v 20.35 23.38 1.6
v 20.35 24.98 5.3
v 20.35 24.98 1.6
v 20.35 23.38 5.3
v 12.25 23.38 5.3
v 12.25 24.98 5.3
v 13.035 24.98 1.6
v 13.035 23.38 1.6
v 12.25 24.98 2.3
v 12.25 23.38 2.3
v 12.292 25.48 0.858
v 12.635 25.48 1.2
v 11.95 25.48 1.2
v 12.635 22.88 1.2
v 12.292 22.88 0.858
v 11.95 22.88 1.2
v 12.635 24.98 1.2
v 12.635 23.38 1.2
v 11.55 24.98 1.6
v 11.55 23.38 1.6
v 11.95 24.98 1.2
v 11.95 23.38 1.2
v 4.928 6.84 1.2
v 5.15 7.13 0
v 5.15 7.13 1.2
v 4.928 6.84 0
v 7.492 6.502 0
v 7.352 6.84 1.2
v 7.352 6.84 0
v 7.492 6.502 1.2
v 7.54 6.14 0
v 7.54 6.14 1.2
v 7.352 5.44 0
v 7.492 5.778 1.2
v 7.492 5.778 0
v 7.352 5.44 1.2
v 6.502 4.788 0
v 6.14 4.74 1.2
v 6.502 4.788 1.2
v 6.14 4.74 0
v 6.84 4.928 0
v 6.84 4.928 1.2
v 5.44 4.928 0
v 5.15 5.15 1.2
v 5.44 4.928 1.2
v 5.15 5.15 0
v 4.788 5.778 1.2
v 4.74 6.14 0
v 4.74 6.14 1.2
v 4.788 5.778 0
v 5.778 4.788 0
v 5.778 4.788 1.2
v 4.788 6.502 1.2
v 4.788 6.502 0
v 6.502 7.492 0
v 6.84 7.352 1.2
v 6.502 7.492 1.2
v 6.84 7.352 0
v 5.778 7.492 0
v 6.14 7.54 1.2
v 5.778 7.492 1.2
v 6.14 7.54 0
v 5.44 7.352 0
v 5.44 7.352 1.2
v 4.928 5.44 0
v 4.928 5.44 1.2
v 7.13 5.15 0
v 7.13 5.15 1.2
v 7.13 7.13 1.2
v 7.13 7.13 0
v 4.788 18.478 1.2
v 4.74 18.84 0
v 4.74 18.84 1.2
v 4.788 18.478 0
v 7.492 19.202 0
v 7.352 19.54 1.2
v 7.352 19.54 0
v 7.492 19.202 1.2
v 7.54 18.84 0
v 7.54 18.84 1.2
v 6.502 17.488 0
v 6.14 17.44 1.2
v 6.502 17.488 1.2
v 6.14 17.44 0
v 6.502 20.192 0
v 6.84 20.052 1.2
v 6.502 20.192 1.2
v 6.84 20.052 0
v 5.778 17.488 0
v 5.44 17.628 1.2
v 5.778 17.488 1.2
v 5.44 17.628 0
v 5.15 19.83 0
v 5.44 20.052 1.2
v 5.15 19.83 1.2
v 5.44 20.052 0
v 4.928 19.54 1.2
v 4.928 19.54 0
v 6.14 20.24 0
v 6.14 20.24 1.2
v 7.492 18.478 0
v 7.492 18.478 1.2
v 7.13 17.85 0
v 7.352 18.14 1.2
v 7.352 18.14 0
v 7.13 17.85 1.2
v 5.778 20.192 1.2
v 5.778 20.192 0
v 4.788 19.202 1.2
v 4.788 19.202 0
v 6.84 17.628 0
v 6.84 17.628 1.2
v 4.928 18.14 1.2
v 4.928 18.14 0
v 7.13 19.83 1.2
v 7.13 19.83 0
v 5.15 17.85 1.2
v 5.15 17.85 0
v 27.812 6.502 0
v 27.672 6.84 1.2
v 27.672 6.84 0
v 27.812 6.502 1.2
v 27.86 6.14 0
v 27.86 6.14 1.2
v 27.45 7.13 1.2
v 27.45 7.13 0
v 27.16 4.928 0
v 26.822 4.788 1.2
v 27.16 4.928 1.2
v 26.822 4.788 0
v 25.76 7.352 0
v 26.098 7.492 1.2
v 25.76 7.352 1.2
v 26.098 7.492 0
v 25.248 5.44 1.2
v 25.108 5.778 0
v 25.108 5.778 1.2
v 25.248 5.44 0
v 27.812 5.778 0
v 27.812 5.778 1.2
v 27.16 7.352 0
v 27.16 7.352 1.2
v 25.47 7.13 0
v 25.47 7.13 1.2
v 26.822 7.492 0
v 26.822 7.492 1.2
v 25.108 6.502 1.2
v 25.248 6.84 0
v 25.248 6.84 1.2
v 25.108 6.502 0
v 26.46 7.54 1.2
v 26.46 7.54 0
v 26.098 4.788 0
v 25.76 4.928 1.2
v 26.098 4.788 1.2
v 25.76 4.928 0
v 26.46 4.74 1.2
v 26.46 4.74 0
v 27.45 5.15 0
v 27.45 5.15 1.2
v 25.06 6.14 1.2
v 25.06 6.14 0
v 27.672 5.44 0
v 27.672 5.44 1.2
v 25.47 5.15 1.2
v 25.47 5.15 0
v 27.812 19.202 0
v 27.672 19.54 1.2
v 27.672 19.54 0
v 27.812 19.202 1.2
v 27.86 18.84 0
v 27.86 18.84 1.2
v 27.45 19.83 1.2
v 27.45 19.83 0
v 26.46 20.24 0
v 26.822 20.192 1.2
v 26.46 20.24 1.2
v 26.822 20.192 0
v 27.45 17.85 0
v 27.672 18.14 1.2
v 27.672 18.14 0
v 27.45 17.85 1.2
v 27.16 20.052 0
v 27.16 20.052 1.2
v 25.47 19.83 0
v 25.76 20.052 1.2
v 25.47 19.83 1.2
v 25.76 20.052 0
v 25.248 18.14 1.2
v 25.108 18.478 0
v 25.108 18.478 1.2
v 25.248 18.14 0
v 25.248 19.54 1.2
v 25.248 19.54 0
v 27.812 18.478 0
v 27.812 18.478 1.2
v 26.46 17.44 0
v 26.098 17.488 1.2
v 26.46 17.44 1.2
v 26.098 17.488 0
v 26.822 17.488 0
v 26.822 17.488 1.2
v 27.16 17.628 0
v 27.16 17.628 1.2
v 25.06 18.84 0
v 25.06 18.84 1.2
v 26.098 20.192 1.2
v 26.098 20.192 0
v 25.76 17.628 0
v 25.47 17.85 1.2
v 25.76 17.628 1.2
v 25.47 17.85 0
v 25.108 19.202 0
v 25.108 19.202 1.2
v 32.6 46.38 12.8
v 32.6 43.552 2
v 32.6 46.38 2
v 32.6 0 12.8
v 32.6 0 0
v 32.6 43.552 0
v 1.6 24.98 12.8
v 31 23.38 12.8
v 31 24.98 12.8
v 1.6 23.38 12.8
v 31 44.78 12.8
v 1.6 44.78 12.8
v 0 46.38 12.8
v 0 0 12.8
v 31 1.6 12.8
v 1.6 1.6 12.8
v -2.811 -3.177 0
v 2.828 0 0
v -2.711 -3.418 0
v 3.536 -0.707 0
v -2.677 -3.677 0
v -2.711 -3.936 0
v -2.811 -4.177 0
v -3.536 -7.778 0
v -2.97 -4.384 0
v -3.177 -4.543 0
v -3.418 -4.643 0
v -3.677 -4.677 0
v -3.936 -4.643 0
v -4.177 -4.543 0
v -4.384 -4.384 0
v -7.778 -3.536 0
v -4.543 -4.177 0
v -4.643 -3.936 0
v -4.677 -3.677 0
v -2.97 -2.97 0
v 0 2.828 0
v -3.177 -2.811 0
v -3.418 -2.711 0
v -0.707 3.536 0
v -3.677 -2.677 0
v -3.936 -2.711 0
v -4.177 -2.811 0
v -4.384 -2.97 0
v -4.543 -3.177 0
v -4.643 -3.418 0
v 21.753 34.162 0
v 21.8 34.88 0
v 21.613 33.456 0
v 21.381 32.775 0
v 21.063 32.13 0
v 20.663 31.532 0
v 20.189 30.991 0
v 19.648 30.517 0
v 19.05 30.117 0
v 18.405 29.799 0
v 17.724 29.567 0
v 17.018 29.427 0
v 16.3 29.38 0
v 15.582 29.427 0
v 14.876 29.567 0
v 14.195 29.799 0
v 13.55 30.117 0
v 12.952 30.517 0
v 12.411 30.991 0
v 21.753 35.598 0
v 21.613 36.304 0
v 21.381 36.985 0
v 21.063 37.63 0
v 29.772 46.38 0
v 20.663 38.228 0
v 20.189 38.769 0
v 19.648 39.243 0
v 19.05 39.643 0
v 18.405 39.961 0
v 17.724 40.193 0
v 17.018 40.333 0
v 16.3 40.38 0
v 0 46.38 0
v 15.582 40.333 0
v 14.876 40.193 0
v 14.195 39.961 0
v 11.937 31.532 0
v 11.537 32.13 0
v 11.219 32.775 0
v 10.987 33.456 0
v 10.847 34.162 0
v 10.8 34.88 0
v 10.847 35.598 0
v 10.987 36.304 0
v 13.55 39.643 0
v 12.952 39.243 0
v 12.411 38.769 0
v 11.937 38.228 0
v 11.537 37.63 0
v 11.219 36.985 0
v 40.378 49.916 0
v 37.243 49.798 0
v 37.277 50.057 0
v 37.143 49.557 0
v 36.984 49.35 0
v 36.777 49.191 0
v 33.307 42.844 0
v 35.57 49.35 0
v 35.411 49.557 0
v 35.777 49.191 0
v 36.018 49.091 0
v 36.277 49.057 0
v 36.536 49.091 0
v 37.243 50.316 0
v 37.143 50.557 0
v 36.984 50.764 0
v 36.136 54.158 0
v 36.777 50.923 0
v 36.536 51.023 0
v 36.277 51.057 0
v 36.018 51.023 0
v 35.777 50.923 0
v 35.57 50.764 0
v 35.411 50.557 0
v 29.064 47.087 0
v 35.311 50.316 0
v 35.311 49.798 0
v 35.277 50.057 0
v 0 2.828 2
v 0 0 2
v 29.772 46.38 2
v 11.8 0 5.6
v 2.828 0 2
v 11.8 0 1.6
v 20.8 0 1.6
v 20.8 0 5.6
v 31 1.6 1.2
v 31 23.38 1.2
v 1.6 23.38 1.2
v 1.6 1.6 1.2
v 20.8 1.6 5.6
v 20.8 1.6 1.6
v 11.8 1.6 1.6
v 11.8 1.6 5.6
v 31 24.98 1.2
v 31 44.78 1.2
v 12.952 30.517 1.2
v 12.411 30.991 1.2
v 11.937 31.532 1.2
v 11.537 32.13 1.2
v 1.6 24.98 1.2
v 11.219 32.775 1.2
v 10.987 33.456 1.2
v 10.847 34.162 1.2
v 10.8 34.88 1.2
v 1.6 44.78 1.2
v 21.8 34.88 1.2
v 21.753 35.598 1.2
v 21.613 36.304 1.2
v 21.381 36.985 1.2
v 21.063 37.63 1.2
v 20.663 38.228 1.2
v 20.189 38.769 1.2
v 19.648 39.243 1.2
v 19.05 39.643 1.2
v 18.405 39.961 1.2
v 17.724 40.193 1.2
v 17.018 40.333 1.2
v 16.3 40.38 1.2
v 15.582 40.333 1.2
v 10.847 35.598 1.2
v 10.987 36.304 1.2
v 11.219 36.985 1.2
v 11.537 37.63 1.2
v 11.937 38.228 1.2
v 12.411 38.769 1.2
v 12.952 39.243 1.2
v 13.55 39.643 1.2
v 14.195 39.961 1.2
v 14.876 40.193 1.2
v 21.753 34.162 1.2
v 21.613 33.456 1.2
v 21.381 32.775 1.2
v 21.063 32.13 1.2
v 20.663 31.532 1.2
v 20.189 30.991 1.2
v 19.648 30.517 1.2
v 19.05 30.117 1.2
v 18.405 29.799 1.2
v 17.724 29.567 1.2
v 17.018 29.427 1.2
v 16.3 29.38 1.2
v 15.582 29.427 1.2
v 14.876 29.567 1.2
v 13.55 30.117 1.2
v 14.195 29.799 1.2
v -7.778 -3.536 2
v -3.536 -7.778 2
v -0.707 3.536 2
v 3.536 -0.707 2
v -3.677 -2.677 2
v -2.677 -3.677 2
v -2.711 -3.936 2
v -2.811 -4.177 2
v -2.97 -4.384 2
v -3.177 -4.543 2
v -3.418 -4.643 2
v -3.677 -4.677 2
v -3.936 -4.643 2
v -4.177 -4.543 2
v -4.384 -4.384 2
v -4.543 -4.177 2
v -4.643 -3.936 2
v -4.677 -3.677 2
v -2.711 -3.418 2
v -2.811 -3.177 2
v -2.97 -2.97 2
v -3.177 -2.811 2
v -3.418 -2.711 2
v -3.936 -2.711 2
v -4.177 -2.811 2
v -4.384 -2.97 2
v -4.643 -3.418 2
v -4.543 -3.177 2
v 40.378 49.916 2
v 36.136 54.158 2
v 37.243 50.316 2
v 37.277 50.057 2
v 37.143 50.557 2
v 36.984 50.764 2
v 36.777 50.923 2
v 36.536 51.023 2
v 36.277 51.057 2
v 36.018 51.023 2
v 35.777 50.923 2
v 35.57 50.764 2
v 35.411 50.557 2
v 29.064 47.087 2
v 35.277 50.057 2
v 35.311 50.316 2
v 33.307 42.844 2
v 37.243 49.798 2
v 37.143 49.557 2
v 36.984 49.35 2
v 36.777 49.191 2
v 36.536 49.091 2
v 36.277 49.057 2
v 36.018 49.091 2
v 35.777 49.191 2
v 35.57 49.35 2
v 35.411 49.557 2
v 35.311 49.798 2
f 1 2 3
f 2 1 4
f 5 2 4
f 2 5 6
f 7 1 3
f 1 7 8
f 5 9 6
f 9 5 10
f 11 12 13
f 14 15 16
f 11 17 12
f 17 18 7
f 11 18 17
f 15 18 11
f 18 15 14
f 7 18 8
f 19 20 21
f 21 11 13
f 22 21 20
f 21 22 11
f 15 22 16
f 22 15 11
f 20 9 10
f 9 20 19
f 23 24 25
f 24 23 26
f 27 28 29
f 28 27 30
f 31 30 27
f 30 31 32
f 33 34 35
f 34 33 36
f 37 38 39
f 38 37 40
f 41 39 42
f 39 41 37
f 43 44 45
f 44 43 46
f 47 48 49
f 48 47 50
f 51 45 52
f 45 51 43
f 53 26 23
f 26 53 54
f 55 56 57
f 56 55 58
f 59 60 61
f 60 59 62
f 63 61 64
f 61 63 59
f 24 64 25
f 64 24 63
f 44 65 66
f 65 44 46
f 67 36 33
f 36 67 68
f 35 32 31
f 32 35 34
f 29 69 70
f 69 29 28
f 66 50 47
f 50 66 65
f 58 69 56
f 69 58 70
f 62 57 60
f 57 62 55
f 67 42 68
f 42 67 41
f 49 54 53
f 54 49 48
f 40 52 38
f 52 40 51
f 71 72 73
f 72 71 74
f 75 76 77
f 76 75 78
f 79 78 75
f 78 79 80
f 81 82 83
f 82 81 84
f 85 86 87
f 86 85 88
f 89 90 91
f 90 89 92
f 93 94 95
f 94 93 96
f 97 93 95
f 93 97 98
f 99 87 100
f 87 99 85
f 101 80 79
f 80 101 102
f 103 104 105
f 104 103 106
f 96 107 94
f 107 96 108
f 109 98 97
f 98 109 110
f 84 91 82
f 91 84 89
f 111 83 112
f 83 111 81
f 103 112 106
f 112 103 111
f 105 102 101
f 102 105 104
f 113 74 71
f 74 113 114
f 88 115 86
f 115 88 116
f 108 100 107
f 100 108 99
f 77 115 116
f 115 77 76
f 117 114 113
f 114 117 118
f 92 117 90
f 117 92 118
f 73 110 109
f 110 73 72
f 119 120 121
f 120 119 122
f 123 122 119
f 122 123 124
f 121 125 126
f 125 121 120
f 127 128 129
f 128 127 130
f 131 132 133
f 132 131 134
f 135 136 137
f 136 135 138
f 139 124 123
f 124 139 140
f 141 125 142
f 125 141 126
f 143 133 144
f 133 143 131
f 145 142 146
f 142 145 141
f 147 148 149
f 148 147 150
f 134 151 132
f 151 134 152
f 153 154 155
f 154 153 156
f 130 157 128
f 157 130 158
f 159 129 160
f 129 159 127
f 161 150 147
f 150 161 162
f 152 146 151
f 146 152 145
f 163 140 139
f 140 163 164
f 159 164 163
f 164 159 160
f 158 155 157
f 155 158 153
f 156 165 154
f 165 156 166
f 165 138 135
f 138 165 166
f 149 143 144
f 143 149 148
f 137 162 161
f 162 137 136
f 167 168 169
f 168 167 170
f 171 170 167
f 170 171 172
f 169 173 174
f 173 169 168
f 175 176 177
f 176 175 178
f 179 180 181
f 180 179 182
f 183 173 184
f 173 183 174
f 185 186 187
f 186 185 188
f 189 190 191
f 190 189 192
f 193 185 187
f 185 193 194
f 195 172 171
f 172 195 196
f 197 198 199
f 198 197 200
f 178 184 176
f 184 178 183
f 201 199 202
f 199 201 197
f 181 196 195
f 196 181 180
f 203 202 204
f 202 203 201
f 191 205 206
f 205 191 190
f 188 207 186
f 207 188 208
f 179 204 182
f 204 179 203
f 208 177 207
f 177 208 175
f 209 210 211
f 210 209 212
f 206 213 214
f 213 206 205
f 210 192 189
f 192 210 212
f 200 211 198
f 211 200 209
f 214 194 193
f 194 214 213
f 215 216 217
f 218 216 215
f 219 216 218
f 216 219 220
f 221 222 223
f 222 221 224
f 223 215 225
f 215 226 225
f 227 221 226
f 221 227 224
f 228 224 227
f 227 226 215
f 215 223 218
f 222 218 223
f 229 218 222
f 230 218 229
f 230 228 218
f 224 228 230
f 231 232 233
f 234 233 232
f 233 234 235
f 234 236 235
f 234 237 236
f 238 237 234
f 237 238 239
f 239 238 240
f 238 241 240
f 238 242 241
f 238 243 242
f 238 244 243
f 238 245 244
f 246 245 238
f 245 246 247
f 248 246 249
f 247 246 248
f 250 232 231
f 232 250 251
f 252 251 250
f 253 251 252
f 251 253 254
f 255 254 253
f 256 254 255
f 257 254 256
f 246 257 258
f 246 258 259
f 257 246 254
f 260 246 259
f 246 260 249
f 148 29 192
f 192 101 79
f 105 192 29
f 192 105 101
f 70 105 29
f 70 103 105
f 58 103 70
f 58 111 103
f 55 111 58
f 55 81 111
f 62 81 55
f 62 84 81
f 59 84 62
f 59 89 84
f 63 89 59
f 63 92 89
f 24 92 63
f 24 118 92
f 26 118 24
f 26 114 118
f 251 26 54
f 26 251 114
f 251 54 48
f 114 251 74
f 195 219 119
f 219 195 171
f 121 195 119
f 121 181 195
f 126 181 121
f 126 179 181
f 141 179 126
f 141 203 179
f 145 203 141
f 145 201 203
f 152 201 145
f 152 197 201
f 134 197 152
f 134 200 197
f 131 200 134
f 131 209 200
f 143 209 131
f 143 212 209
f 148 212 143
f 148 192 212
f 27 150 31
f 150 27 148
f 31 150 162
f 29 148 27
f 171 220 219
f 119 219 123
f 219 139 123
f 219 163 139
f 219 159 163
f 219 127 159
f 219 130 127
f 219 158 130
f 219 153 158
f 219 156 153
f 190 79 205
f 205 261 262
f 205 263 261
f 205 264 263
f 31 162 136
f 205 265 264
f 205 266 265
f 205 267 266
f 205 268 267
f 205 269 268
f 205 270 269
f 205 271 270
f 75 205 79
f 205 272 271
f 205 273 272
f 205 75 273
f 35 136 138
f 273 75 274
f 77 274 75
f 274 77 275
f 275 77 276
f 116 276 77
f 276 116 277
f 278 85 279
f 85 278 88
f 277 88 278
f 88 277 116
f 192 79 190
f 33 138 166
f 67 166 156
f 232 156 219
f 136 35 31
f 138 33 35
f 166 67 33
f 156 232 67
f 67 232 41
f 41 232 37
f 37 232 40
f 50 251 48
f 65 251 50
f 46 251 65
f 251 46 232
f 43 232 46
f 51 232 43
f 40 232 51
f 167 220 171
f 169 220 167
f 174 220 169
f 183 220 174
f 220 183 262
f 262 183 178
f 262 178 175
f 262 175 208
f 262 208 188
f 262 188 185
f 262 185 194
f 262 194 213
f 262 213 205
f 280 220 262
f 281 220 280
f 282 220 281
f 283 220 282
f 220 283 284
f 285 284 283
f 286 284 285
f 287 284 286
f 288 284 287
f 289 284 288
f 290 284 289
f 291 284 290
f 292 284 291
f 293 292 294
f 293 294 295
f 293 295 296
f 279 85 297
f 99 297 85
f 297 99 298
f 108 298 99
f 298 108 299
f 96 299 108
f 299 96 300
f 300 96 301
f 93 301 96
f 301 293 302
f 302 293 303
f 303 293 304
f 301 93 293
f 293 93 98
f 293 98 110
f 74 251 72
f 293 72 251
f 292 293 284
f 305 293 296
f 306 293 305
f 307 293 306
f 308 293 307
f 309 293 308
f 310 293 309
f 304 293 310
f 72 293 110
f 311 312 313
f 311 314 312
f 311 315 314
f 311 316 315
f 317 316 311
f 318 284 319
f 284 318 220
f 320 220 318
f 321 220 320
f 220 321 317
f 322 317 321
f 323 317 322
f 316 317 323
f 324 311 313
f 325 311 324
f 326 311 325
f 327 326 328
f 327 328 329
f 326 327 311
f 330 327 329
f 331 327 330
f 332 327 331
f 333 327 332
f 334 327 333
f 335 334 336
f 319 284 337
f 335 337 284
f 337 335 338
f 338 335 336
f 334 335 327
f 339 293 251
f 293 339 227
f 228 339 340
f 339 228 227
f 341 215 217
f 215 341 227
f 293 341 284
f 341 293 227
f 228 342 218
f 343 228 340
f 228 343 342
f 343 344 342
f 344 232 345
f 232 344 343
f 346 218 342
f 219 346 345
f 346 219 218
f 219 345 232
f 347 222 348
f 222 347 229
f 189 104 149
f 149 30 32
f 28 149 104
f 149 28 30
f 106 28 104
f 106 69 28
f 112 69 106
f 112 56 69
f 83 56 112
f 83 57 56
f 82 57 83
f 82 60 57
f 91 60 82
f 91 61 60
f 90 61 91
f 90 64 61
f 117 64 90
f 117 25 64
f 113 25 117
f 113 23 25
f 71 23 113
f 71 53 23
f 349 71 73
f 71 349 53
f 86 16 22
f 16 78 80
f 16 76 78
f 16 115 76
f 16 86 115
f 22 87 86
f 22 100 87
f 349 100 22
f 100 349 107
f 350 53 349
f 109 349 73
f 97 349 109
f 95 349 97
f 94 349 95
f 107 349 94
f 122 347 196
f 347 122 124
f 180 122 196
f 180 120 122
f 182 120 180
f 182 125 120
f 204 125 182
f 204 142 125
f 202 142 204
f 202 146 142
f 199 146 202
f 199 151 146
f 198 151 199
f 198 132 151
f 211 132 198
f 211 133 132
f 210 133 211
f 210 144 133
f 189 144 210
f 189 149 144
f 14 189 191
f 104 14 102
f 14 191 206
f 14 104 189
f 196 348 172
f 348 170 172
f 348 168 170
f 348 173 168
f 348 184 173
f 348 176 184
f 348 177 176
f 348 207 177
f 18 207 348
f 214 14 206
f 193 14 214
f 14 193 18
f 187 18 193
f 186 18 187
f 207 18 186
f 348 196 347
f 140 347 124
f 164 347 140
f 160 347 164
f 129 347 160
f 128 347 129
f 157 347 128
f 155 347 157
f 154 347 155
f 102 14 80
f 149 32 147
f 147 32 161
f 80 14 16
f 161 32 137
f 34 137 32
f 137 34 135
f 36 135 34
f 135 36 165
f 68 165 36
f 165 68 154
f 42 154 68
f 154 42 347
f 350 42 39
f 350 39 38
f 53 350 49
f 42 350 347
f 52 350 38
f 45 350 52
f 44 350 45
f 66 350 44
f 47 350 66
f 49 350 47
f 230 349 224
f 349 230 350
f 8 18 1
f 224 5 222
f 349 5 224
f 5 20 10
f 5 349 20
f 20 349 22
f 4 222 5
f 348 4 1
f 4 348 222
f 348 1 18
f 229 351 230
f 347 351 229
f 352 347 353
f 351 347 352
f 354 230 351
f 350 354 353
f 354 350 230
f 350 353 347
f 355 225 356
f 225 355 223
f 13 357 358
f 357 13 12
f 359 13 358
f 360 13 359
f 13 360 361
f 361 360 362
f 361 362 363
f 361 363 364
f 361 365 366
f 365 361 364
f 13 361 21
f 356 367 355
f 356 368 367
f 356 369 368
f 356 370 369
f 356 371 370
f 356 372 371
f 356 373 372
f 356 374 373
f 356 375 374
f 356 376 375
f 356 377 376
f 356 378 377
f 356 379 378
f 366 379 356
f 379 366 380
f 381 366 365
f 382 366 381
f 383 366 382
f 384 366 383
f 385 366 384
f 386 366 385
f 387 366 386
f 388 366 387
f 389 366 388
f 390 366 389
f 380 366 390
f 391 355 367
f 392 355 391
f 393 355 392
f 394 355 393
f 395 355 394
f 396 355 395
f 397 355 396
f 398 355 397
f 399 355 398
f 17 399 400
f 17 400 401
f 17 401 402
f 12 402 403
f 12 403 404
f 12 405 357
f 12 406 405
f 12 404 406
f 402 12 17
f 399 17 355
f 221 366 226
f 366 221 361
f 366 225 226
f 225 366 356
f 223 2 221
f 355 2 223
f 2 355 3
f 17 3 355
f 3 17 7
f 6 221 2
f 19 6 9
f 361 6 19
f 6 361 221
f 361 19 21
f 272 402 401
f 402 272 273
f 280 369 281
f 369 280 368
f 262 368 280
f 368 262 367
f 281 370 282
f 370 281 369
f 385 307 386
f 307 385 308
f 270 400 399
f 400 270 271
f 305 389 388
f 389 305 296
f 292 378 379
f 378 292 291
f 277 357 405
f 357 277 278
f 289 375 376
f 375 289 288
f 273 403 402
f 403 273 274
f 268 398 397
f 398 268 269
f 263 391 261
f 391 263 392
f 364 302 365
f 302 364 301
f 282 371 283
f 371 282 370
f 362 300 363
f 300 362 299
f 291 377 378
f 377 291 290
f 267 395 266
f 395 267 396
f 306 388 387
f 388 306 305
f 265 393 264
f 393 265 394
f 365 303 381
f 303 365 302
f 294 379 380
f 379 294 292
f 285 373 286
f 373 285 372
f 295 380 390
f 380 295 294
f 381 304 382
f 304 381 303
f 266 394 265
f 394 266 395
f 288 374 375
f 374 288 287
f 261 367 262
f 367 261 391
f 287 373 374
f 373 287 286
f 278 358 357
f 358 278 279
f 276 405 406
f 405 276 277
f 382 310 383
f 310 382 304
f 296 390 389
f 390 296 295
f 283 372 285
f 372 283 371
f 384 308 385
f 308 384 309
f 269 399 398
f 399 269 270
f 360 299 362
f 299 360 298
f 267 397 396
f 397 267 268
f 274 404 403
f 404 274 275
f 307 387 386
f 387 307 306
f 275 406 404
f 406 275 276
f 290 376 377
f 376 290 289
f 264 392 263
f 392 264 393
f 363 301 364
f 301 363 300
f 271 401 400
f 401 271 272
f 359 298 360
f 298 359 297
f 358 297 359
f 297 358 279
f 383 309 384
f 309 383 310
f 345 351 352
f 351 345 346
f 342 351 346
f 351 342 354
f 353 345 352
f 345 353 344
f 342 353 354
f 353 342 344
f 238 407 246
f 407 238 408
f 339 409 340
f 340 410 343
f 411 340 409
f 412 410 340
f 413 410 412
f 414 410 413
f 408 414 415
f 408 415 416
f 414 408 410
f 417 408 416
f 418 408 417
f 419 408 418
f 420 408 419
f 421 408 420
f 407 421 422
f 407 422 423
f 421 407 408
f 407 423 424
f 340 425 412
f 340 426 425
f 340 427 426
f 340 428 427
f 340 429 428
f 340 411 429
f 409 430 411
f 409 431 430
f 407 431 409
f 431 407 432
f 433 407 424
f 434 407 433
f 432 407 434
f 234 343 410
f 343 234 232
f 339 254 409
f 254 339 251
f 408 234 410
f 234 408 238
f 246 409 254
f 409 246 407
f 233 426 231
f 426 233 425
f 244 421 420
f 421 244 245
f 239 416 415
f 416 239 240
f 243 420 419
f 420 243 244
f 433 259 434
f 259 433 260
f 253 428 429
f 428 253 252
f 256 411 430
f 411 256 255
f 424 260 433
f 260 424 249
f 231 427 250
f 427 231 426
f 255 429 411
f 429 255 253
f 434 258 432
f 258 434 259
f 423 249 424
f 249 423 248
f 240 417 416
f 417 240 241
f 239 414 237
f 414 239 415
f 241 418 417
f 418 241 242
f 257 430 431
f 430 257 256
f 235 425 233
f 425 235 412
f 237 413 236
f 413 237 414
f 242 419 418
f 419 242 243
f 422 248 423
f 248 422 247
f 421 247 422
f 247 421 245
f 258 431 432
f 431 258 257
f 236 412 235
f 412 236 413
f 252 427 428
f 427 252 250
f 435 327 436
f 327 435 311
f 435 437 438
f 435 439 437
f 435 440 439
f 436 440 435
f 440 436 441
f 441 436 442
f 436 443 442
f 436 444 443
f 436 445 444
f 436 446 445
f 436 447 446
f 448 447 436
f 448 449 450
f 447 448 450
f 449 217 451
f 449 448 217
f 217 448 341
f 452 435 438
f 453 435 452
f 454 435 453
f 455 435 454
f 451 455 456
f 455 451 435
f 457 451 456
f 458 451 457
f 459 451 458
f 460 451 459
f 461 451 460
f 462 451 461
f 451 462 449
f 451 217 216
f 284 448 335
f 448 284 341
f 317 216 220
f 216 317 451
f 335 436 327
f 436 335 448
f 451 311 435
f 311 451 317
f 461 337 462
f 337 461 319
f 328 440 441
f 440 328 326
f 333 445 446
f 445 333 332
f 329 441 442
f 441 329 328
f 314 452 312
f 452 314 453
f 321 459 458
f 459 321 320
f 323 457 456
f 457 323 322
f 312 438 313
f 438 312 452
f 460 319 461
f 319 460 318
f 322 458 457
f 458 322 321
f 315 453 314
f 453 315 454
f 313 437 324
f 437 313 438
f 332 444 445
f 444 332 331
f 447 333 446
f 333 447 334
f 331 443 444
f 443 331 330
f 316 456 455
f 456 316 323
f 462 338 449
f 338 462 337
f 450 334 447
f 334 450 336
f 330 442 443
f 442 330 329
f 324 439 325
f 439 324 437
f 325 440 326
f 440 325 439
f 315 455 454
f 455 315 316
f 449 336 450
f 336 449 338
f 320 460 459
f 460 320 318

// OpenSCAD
// ============================================================
//  Meridian Wrist Array — Satellite Pod v2
//  Rebuilt Aug 2026 | Sean (Whitehorse, YT)
//
//  ** REBUILD NOTICE **
//  The original satellite_pod_v2.scad could not be found on disk.
//  This file was reconstructed from two sources:
//    1. Authored parameter/geometry fragments recovered from past
//       conversation transcripts (marked CONFIRMED below).
//    2. Direct measurement of satellite_pod_v2_side.stl, which you
//       still had. Two values were back-solved from that mesh and
//       are marked DERIVED — trustworthy as dimensions, but the
//       original formulas that produced them are not recovered.
//    3. A few features (screw boss exact placement, lid rim) had no
//       surviving source text at all and are marked REBUILT — these
//       are reasonable reconstructions, not verified originals.
//       Cross-check against your physical prints before reprinting
//       a batch on these.
//
//  Rendered POD_L and POD_H below reproduce the uploaded STL's
//  bounding box exactly (33.2 x 46.6 x 12.8mm) — see the print
//  at the bottom of this file for the live check.
//
//  v2 change (CONFIRMED, from source): LRA pocket placement is a
//  parameter.
//    LRA_SIDE = "end"   -> v1 layout, pocket beyond the chamber's
//                          far end: [ DRV ][ div ][ LRA ]
//    LRA_SIDE = "side"  -> pocket alongside the chamber's long
//                          wall (pod gets wider, shorter):
//                              [ DRV chamber ]
//                              [   divider   ]
//                              [ LRA pocket  ]
//    LRA_X_FRAC slides the LRA along the chamber length in side
//    mode, 0.0 = cable-hole end, 1.0 = far end. NOT recovered from
//    source — set to 0.5 as a placeholder. Re-tune by dry-fitting
//    your DRV board and aligning to its OUT+/OUT- pads before
//    trusting this value.
//
//  NEW in this rebuild: LRA_CONN geometry. A notch through the
//  divider wall sized to the in-line connector on your LRA lead
//  (measured 6.90 x 3.20 x 2.20mm), positioned low near the floor
//  so it stays clear of the lid parting line rather than needing
//  a lid-side channel.
// ============================================================

// ---- Pod variant switch (CONFIRMED) ----
BOARD_TYPE = "drv_lra"; // "drv_lra" or "mux" -- this STL was drv_lra (verified: CHAMBER_L math reproduces measured 33.2mm exactly only with DRV_L, not MUX_L)
LRA_SIDE   = "side";    // "end" or "side"
LRA_X_FRAC = 0.5;       // REBUILT placeholder -- re-tune by dry fit, see note above

// ---- Component dimensions ----
// DRV_L/DRV_W updated to Adafruit's official fab print (1.00" x 0.70"),
// pulled directly from their published downloads page -- this replaces
// the earlier 26x18 rounded estimate.
DRV_L = 25.4;   // Adafruit DRV2605L STEMMA QT board length
DRV_W = 17.78;  // board width
// Mounting hole pattern, same source: 4 holes, 0.80" x 0.50" spacing,
// inset 0.10" (2.54mm) from every edge -- symmetric on all 4 corners.
DRV_HOLE_INSET = 2.54;
MUX_L = 31;    // TCA9548A breakout length -- Sean measured
MUX_W = 17.71; // TCA9548A breakout width -- Sean measured
BOARD_CLR = 2; // clearance added around the board, each side

LRA_D = 10;    // LRA diameter (coin-type)
LRA_T = 4;     // LRA thickness
LRA_SKIN_GAP = 1.0; // skin-contact opening = LRA_D + this

HAS_POCKET = (BOARD_TYPE == "drv_lra");
BOARD_L = (BOARD_TYPE == "mux") ? MUX_L : DRV_L;
BOARD_W = (BOARD_TYPE == "mux") ? MUX_W : DRV_W;

// ---- Wall/floor/lid thicknesses (CONFIRMED) ----
WALL  = 1.6;
FLOOR = 1.2;
LID_T = 1.6;
DIVIDER_T = WALL;

// ---- Derived chamber sizes (CONFIRMED formula, CHAMBER_H confirmed) ----
CHAMBER_L = BOARD_L + BOARD_CLR*2;
CHAMBER_W = BOARD_W + BOARD_CLR*2;
CHAMBER_H = 10; // matches puck's rev-4.5 DRV clearance convention; check vs your actual board+header stack

// ---- Pocket sizing (DERIVED from STL -- formula not recovered) ----
POCKET_SPAN = 19.8; // back-solved from measured pod Y=46.6mm; treat as a known-good
                     // number for THIS pod, not a formula to trust for other boards
POCKET_H = CHAMBER_H;

// ---- NEW: LRA connector channel through the divider ----
// Measured connector body: 6.90(L) x 3.20(W) x 2.20(H)mm
CONN_L = 6.90;
CONN_W = 3.20;
CONN_H = 2.20;
CONN_CLR_W = 0.7;   // total width clearance (per side ~0.35, PETG print tolerance)
CONN_CLR_H = 1.5;   // total height clearance -- bumped +1mm from 0.5 per print fit test (was too short)
CHANNEL_W = CONN_L + 1.2;      // 9-10mm target: length axis of connector runs along the channel
CHANNEL_H = CONN_H + CONN_CLR_H; // 3.7mm -- fits within DIVIDER_T's adjacent floor zone
CHANNEL_MOUTH_CHAMFER = 0.7;   // chamfer at each channel mouth so the wire jacket doesn't bite on a sharp edge

// Position: aligned with LRA_X_FRAC by default so the channel sits
// right next to wherever the LRA pocket actually lands. Override
// with CHANNEL_X_FRAC if your DRV board's OUT+/OUT- pads are
// somewhere else along the chamber.
CHANNEL_X_FRAC = LRA_X_FRAC;
CHANNEL_X = WALL + (CHAMBER_L - CHANNEL_W) * CHANNEL_X_FRAC;
CHANNEL_Z = FLOOR + 0.4; // low, near the floor -- clear of the lid regardless of LID_T

// ---- NEW: cable exit channel through the outer wall ----
// The STEMMA pigtail currently just drapes over the wall's top edge --
// this cuts a proper low channel so the lid can close flat over it,
// same approach as the divider channel above.
//
// PLACEHOLDER -- sized generously (JST-SH female housings run roughly
// 6-8mm x 3-4mm from general knowledge of the part, not a measurement
// of yours specifically). Measure your actual housing + cable bundle
// and tighten this before printing a batch -- same as the LRA
// connector channel, this is exactly the kind of number worth getting
// from calipers rather than an estimate.
CABLE_CHANNEL_W = 9.0;  // along the wall (X axis)
CABLE_CHANNEL_H = 4.0;  // channel height
CABLE_CHANNEL_X_FRAC = 0.5; // centered along the chamber length -- both STEMMA
                             // connectors looked roughly centered in your photos

// ---- Pod outer envelope ----
POD_L = WALL + CHAMBER_L + WALL; // side mode: length axis is just the chamber, unchanged from v1
POD_W = HAS_POCKET && LRA_SIDE == "side"
    ? (WALL + CHAMBER_W + DIVIDER_T + POCKET_SPAN + WALL)
    : (CHAMBER_W + WALL*2);
POD_H = FLOOR + CHAMBER_H + LID_T;

// ---- NEW: stitch tabs for sewing the pod to a non-stretch rail ----
// No surviving source for these -- fresh design. Two tabs at diagonal
// corners (same convention as the screw bosses below), each a flat
// wing in the floor plane with a through-hole for waxed thread/floss.
// Bump TAB_HOLE_D if you're using something chunkier like paracord.
TAB_W = 8.0;       // tab length, projecting out from the corner
TAB_D = 6.0;       // tab width, perpendicular to projection
TAB_T = 2.0;       // tab thickness -- slightly thicker than FLOOR alone for stitch durability
TAB_HOLE_D = 2.0;  // through-hole diameter
TAB_HOLE_FRAC = 0.65; // hole position along the tab length, clear of the wall root
TAB_OVERLAP = 2.0; // tab extends this far INTO the shell wall so the union is a real
                    // solid merge, not just two solids touching along one edge

module stitch_tab(corner_x, corner_y, angle_deg) {
    translate([corner_x, corner_y, 0])
        rotate([0, 0, angle_deg])
            difference() {
                translate([-TAB_OVERLAP, -TAB_D/2, 0])
                    cube([TAB_W + TAB_OVERLAP, TAB_D, TAB_T]);
                translate([TAB_W * TAB_HOLE_FRAC, 0, -0.5])
                    cylinder(d=TAB_HOLE_D, h=TAB_T + 1, $fn=24);
            }
}

module stitch_tabs() {
    stitch_tab(0, 0, 225);         // near corner, points away into -x,-y
    stitch_tab(POD_L, POD_W, 45);  // far corner, points away into +x,+y
}

// ---- Board mounting: 4 holes at the real Adafruit hole pattern,
//      sized for off-the-shelf brass standoffs rather than printed
//      self-tapped threads -- printed plastic threads don't hold up
//      to repeated rebuild cycles the way a metal standoff does.
//
//      Geometry: a screw passes up through the floor from outside
//      the pod into the standoff's bottom thread; the board's own
//      screw threads into the standoff's top. The pod only needs a
//      clearance hole in the floor at each of the 4 positions, no
//      printed boss required.
//
//      PLACEHOLDER -- I don't have your standoff's actual thread
//      size. STANDOFF_SCREW_CLR below assumes M2.5 clearance as a
//      reasonable starting guess. Measure the screw shaft OD (not
//      the hex body) and adjust before printing a batch.
STANDOFF_SCREW_CLR = 2.8; // floor clearance hole diameter for the mounting screw

// hole centers, in chamber-local coordinates (board sits BOARD_CLR
// inside the chamber wall, holes are DRV_HOLE_INSET inside the board edge)
BOSS_INSET = BOARD_CLR + DRV_HOLE_INSET; // = 4.54mm, same for both axes given the symmetric spec

module mount_holes() {
    for (mx = [BOSS_INSET, CHAMBER_L - BOSS_INSET])
        for (my = [BOSS_INSET, CHAMBER_W - BOSS_INSET])
            translate([WALL + mx, WALL + my, -0.5])
                cylinder(d=STANDOFF_SCREW_CLR, h=FLOOR + 1, $fn=24);
}

module pod_body() {
    difference() {
        // outer shell
        cube([POD_L, POD_W, POD_H]);

        // main chamber void -- open-top tray (through-cut fix from the
        // July 28 session: +LID_T so no membrane seals the top)
        translate([WALL, WALL, FLOOR])
            cube([CHAMBER_L, CHAMBER_W, CHAMBER_H + LID_T + 1]);

        // LRA pocket void
        if (HAS_POCKET) {
            if (LRA_SIDE == "side") {
                translate([WALL, WALL + CHAMBER_W + DIVIDER_T, FLOOR])
                    cube([CHAMBER_L, POCKET_SPAN, POCKET_H + LID_T + 1]);
            } else {
                translate([WALL + CHAMBER_L + DIVIDER_T, WALL, FLOOR])
                    cube([POCKET_SPAN, CHAMBER_W, POCKET_H + LID_T + 1]);
            }
        }

        // LRA skin window -- through the floor, centered in the pocket
        // at LRA_X_FRAC along the chamber length
        if (HAS_POCKET) {
            lra_cx = WALL + CHAMBER_L * LRA_X_FRAC;
            lra_cy = WALL + CHAMBER_W + DIVIDER_T + POCKET_SPAN/2;
            translate([lra_cx, lra_cy, -0.5])
                cylinder(d=LRA_D + LRA_SKIN_GAP, h=FLOOR+1, $fn=48);
        }

        // NEW: connector channel through the divider, low near the floor
        if (HAS_POCKET && LRA_SIDE == "side") {
            translate([CHANNEL_X, WALL + CHAMBER_W - 0.5, CHANNEL_Z])
                cube([CHANNEL_W, DIVIDER_T + 1, CHANNEL_H]);
            // chamfer both mouths so the wire/connector doesn't ride a sharp edge
            translate([CHANNEL_X - CHANNEL_MOUTH_CHAMFER, WALL + CHAMBER_W - 0.5, CHANNEL_Z])
                rotate([0,45,0])
                    cube([CHANNEL_MOUTH_CHAMFER*1.5, DIVIDER_T + 1, CHANNEL_H]);
        }

        // cable exit channel -- low through the front wall (y=0), same
        // logic as the divider channel: keep it near the floor so the
        // lid parting line stays clear
        cable_cx = WALL + (CHAMBER_L - CABLE_CHANNEL_W) * CABLE_CHANNEL_X_FRAC;
        translate([cable_cx, -0.5, FLOOR + 0.4])
            cube([CABLE_CHANNEL_W, WALL + 1, CABLE_CHANNEL_H]);

        // 4 floor clearance holes for standoff mounting screws
        mount_holes();
    }

    // stitch tabs for rail attachment
    stitch_tabs();
}

module pod_lid() {
    // REBUILT -- lid footprint measured off the uploaded STL
    // (33.2 x 42.8 x 1.6mm), inset from the outer wall
    lid_w = POD_W - 3.8; // matches measured lid Y vs body Y difference
    translate([0, 1.9, 0])
        cube([POD_L, lid_w, LID_T]);
}

RENDER = "body"; // "body" | "lid" | "preview"

if (RENDER == "body") pod_body();
else if (RENDER == "lid") pod_lid();
else {
    color("SteelBlue") pod_body();
    color([0.6,0.6,0.9,0.4]) translate([0,0,POD_H - LID_T]) pod_lid();
}

echo("POD_L =", POD_L, " POD_W =", POD_W, " POD_H =", POD_H);
